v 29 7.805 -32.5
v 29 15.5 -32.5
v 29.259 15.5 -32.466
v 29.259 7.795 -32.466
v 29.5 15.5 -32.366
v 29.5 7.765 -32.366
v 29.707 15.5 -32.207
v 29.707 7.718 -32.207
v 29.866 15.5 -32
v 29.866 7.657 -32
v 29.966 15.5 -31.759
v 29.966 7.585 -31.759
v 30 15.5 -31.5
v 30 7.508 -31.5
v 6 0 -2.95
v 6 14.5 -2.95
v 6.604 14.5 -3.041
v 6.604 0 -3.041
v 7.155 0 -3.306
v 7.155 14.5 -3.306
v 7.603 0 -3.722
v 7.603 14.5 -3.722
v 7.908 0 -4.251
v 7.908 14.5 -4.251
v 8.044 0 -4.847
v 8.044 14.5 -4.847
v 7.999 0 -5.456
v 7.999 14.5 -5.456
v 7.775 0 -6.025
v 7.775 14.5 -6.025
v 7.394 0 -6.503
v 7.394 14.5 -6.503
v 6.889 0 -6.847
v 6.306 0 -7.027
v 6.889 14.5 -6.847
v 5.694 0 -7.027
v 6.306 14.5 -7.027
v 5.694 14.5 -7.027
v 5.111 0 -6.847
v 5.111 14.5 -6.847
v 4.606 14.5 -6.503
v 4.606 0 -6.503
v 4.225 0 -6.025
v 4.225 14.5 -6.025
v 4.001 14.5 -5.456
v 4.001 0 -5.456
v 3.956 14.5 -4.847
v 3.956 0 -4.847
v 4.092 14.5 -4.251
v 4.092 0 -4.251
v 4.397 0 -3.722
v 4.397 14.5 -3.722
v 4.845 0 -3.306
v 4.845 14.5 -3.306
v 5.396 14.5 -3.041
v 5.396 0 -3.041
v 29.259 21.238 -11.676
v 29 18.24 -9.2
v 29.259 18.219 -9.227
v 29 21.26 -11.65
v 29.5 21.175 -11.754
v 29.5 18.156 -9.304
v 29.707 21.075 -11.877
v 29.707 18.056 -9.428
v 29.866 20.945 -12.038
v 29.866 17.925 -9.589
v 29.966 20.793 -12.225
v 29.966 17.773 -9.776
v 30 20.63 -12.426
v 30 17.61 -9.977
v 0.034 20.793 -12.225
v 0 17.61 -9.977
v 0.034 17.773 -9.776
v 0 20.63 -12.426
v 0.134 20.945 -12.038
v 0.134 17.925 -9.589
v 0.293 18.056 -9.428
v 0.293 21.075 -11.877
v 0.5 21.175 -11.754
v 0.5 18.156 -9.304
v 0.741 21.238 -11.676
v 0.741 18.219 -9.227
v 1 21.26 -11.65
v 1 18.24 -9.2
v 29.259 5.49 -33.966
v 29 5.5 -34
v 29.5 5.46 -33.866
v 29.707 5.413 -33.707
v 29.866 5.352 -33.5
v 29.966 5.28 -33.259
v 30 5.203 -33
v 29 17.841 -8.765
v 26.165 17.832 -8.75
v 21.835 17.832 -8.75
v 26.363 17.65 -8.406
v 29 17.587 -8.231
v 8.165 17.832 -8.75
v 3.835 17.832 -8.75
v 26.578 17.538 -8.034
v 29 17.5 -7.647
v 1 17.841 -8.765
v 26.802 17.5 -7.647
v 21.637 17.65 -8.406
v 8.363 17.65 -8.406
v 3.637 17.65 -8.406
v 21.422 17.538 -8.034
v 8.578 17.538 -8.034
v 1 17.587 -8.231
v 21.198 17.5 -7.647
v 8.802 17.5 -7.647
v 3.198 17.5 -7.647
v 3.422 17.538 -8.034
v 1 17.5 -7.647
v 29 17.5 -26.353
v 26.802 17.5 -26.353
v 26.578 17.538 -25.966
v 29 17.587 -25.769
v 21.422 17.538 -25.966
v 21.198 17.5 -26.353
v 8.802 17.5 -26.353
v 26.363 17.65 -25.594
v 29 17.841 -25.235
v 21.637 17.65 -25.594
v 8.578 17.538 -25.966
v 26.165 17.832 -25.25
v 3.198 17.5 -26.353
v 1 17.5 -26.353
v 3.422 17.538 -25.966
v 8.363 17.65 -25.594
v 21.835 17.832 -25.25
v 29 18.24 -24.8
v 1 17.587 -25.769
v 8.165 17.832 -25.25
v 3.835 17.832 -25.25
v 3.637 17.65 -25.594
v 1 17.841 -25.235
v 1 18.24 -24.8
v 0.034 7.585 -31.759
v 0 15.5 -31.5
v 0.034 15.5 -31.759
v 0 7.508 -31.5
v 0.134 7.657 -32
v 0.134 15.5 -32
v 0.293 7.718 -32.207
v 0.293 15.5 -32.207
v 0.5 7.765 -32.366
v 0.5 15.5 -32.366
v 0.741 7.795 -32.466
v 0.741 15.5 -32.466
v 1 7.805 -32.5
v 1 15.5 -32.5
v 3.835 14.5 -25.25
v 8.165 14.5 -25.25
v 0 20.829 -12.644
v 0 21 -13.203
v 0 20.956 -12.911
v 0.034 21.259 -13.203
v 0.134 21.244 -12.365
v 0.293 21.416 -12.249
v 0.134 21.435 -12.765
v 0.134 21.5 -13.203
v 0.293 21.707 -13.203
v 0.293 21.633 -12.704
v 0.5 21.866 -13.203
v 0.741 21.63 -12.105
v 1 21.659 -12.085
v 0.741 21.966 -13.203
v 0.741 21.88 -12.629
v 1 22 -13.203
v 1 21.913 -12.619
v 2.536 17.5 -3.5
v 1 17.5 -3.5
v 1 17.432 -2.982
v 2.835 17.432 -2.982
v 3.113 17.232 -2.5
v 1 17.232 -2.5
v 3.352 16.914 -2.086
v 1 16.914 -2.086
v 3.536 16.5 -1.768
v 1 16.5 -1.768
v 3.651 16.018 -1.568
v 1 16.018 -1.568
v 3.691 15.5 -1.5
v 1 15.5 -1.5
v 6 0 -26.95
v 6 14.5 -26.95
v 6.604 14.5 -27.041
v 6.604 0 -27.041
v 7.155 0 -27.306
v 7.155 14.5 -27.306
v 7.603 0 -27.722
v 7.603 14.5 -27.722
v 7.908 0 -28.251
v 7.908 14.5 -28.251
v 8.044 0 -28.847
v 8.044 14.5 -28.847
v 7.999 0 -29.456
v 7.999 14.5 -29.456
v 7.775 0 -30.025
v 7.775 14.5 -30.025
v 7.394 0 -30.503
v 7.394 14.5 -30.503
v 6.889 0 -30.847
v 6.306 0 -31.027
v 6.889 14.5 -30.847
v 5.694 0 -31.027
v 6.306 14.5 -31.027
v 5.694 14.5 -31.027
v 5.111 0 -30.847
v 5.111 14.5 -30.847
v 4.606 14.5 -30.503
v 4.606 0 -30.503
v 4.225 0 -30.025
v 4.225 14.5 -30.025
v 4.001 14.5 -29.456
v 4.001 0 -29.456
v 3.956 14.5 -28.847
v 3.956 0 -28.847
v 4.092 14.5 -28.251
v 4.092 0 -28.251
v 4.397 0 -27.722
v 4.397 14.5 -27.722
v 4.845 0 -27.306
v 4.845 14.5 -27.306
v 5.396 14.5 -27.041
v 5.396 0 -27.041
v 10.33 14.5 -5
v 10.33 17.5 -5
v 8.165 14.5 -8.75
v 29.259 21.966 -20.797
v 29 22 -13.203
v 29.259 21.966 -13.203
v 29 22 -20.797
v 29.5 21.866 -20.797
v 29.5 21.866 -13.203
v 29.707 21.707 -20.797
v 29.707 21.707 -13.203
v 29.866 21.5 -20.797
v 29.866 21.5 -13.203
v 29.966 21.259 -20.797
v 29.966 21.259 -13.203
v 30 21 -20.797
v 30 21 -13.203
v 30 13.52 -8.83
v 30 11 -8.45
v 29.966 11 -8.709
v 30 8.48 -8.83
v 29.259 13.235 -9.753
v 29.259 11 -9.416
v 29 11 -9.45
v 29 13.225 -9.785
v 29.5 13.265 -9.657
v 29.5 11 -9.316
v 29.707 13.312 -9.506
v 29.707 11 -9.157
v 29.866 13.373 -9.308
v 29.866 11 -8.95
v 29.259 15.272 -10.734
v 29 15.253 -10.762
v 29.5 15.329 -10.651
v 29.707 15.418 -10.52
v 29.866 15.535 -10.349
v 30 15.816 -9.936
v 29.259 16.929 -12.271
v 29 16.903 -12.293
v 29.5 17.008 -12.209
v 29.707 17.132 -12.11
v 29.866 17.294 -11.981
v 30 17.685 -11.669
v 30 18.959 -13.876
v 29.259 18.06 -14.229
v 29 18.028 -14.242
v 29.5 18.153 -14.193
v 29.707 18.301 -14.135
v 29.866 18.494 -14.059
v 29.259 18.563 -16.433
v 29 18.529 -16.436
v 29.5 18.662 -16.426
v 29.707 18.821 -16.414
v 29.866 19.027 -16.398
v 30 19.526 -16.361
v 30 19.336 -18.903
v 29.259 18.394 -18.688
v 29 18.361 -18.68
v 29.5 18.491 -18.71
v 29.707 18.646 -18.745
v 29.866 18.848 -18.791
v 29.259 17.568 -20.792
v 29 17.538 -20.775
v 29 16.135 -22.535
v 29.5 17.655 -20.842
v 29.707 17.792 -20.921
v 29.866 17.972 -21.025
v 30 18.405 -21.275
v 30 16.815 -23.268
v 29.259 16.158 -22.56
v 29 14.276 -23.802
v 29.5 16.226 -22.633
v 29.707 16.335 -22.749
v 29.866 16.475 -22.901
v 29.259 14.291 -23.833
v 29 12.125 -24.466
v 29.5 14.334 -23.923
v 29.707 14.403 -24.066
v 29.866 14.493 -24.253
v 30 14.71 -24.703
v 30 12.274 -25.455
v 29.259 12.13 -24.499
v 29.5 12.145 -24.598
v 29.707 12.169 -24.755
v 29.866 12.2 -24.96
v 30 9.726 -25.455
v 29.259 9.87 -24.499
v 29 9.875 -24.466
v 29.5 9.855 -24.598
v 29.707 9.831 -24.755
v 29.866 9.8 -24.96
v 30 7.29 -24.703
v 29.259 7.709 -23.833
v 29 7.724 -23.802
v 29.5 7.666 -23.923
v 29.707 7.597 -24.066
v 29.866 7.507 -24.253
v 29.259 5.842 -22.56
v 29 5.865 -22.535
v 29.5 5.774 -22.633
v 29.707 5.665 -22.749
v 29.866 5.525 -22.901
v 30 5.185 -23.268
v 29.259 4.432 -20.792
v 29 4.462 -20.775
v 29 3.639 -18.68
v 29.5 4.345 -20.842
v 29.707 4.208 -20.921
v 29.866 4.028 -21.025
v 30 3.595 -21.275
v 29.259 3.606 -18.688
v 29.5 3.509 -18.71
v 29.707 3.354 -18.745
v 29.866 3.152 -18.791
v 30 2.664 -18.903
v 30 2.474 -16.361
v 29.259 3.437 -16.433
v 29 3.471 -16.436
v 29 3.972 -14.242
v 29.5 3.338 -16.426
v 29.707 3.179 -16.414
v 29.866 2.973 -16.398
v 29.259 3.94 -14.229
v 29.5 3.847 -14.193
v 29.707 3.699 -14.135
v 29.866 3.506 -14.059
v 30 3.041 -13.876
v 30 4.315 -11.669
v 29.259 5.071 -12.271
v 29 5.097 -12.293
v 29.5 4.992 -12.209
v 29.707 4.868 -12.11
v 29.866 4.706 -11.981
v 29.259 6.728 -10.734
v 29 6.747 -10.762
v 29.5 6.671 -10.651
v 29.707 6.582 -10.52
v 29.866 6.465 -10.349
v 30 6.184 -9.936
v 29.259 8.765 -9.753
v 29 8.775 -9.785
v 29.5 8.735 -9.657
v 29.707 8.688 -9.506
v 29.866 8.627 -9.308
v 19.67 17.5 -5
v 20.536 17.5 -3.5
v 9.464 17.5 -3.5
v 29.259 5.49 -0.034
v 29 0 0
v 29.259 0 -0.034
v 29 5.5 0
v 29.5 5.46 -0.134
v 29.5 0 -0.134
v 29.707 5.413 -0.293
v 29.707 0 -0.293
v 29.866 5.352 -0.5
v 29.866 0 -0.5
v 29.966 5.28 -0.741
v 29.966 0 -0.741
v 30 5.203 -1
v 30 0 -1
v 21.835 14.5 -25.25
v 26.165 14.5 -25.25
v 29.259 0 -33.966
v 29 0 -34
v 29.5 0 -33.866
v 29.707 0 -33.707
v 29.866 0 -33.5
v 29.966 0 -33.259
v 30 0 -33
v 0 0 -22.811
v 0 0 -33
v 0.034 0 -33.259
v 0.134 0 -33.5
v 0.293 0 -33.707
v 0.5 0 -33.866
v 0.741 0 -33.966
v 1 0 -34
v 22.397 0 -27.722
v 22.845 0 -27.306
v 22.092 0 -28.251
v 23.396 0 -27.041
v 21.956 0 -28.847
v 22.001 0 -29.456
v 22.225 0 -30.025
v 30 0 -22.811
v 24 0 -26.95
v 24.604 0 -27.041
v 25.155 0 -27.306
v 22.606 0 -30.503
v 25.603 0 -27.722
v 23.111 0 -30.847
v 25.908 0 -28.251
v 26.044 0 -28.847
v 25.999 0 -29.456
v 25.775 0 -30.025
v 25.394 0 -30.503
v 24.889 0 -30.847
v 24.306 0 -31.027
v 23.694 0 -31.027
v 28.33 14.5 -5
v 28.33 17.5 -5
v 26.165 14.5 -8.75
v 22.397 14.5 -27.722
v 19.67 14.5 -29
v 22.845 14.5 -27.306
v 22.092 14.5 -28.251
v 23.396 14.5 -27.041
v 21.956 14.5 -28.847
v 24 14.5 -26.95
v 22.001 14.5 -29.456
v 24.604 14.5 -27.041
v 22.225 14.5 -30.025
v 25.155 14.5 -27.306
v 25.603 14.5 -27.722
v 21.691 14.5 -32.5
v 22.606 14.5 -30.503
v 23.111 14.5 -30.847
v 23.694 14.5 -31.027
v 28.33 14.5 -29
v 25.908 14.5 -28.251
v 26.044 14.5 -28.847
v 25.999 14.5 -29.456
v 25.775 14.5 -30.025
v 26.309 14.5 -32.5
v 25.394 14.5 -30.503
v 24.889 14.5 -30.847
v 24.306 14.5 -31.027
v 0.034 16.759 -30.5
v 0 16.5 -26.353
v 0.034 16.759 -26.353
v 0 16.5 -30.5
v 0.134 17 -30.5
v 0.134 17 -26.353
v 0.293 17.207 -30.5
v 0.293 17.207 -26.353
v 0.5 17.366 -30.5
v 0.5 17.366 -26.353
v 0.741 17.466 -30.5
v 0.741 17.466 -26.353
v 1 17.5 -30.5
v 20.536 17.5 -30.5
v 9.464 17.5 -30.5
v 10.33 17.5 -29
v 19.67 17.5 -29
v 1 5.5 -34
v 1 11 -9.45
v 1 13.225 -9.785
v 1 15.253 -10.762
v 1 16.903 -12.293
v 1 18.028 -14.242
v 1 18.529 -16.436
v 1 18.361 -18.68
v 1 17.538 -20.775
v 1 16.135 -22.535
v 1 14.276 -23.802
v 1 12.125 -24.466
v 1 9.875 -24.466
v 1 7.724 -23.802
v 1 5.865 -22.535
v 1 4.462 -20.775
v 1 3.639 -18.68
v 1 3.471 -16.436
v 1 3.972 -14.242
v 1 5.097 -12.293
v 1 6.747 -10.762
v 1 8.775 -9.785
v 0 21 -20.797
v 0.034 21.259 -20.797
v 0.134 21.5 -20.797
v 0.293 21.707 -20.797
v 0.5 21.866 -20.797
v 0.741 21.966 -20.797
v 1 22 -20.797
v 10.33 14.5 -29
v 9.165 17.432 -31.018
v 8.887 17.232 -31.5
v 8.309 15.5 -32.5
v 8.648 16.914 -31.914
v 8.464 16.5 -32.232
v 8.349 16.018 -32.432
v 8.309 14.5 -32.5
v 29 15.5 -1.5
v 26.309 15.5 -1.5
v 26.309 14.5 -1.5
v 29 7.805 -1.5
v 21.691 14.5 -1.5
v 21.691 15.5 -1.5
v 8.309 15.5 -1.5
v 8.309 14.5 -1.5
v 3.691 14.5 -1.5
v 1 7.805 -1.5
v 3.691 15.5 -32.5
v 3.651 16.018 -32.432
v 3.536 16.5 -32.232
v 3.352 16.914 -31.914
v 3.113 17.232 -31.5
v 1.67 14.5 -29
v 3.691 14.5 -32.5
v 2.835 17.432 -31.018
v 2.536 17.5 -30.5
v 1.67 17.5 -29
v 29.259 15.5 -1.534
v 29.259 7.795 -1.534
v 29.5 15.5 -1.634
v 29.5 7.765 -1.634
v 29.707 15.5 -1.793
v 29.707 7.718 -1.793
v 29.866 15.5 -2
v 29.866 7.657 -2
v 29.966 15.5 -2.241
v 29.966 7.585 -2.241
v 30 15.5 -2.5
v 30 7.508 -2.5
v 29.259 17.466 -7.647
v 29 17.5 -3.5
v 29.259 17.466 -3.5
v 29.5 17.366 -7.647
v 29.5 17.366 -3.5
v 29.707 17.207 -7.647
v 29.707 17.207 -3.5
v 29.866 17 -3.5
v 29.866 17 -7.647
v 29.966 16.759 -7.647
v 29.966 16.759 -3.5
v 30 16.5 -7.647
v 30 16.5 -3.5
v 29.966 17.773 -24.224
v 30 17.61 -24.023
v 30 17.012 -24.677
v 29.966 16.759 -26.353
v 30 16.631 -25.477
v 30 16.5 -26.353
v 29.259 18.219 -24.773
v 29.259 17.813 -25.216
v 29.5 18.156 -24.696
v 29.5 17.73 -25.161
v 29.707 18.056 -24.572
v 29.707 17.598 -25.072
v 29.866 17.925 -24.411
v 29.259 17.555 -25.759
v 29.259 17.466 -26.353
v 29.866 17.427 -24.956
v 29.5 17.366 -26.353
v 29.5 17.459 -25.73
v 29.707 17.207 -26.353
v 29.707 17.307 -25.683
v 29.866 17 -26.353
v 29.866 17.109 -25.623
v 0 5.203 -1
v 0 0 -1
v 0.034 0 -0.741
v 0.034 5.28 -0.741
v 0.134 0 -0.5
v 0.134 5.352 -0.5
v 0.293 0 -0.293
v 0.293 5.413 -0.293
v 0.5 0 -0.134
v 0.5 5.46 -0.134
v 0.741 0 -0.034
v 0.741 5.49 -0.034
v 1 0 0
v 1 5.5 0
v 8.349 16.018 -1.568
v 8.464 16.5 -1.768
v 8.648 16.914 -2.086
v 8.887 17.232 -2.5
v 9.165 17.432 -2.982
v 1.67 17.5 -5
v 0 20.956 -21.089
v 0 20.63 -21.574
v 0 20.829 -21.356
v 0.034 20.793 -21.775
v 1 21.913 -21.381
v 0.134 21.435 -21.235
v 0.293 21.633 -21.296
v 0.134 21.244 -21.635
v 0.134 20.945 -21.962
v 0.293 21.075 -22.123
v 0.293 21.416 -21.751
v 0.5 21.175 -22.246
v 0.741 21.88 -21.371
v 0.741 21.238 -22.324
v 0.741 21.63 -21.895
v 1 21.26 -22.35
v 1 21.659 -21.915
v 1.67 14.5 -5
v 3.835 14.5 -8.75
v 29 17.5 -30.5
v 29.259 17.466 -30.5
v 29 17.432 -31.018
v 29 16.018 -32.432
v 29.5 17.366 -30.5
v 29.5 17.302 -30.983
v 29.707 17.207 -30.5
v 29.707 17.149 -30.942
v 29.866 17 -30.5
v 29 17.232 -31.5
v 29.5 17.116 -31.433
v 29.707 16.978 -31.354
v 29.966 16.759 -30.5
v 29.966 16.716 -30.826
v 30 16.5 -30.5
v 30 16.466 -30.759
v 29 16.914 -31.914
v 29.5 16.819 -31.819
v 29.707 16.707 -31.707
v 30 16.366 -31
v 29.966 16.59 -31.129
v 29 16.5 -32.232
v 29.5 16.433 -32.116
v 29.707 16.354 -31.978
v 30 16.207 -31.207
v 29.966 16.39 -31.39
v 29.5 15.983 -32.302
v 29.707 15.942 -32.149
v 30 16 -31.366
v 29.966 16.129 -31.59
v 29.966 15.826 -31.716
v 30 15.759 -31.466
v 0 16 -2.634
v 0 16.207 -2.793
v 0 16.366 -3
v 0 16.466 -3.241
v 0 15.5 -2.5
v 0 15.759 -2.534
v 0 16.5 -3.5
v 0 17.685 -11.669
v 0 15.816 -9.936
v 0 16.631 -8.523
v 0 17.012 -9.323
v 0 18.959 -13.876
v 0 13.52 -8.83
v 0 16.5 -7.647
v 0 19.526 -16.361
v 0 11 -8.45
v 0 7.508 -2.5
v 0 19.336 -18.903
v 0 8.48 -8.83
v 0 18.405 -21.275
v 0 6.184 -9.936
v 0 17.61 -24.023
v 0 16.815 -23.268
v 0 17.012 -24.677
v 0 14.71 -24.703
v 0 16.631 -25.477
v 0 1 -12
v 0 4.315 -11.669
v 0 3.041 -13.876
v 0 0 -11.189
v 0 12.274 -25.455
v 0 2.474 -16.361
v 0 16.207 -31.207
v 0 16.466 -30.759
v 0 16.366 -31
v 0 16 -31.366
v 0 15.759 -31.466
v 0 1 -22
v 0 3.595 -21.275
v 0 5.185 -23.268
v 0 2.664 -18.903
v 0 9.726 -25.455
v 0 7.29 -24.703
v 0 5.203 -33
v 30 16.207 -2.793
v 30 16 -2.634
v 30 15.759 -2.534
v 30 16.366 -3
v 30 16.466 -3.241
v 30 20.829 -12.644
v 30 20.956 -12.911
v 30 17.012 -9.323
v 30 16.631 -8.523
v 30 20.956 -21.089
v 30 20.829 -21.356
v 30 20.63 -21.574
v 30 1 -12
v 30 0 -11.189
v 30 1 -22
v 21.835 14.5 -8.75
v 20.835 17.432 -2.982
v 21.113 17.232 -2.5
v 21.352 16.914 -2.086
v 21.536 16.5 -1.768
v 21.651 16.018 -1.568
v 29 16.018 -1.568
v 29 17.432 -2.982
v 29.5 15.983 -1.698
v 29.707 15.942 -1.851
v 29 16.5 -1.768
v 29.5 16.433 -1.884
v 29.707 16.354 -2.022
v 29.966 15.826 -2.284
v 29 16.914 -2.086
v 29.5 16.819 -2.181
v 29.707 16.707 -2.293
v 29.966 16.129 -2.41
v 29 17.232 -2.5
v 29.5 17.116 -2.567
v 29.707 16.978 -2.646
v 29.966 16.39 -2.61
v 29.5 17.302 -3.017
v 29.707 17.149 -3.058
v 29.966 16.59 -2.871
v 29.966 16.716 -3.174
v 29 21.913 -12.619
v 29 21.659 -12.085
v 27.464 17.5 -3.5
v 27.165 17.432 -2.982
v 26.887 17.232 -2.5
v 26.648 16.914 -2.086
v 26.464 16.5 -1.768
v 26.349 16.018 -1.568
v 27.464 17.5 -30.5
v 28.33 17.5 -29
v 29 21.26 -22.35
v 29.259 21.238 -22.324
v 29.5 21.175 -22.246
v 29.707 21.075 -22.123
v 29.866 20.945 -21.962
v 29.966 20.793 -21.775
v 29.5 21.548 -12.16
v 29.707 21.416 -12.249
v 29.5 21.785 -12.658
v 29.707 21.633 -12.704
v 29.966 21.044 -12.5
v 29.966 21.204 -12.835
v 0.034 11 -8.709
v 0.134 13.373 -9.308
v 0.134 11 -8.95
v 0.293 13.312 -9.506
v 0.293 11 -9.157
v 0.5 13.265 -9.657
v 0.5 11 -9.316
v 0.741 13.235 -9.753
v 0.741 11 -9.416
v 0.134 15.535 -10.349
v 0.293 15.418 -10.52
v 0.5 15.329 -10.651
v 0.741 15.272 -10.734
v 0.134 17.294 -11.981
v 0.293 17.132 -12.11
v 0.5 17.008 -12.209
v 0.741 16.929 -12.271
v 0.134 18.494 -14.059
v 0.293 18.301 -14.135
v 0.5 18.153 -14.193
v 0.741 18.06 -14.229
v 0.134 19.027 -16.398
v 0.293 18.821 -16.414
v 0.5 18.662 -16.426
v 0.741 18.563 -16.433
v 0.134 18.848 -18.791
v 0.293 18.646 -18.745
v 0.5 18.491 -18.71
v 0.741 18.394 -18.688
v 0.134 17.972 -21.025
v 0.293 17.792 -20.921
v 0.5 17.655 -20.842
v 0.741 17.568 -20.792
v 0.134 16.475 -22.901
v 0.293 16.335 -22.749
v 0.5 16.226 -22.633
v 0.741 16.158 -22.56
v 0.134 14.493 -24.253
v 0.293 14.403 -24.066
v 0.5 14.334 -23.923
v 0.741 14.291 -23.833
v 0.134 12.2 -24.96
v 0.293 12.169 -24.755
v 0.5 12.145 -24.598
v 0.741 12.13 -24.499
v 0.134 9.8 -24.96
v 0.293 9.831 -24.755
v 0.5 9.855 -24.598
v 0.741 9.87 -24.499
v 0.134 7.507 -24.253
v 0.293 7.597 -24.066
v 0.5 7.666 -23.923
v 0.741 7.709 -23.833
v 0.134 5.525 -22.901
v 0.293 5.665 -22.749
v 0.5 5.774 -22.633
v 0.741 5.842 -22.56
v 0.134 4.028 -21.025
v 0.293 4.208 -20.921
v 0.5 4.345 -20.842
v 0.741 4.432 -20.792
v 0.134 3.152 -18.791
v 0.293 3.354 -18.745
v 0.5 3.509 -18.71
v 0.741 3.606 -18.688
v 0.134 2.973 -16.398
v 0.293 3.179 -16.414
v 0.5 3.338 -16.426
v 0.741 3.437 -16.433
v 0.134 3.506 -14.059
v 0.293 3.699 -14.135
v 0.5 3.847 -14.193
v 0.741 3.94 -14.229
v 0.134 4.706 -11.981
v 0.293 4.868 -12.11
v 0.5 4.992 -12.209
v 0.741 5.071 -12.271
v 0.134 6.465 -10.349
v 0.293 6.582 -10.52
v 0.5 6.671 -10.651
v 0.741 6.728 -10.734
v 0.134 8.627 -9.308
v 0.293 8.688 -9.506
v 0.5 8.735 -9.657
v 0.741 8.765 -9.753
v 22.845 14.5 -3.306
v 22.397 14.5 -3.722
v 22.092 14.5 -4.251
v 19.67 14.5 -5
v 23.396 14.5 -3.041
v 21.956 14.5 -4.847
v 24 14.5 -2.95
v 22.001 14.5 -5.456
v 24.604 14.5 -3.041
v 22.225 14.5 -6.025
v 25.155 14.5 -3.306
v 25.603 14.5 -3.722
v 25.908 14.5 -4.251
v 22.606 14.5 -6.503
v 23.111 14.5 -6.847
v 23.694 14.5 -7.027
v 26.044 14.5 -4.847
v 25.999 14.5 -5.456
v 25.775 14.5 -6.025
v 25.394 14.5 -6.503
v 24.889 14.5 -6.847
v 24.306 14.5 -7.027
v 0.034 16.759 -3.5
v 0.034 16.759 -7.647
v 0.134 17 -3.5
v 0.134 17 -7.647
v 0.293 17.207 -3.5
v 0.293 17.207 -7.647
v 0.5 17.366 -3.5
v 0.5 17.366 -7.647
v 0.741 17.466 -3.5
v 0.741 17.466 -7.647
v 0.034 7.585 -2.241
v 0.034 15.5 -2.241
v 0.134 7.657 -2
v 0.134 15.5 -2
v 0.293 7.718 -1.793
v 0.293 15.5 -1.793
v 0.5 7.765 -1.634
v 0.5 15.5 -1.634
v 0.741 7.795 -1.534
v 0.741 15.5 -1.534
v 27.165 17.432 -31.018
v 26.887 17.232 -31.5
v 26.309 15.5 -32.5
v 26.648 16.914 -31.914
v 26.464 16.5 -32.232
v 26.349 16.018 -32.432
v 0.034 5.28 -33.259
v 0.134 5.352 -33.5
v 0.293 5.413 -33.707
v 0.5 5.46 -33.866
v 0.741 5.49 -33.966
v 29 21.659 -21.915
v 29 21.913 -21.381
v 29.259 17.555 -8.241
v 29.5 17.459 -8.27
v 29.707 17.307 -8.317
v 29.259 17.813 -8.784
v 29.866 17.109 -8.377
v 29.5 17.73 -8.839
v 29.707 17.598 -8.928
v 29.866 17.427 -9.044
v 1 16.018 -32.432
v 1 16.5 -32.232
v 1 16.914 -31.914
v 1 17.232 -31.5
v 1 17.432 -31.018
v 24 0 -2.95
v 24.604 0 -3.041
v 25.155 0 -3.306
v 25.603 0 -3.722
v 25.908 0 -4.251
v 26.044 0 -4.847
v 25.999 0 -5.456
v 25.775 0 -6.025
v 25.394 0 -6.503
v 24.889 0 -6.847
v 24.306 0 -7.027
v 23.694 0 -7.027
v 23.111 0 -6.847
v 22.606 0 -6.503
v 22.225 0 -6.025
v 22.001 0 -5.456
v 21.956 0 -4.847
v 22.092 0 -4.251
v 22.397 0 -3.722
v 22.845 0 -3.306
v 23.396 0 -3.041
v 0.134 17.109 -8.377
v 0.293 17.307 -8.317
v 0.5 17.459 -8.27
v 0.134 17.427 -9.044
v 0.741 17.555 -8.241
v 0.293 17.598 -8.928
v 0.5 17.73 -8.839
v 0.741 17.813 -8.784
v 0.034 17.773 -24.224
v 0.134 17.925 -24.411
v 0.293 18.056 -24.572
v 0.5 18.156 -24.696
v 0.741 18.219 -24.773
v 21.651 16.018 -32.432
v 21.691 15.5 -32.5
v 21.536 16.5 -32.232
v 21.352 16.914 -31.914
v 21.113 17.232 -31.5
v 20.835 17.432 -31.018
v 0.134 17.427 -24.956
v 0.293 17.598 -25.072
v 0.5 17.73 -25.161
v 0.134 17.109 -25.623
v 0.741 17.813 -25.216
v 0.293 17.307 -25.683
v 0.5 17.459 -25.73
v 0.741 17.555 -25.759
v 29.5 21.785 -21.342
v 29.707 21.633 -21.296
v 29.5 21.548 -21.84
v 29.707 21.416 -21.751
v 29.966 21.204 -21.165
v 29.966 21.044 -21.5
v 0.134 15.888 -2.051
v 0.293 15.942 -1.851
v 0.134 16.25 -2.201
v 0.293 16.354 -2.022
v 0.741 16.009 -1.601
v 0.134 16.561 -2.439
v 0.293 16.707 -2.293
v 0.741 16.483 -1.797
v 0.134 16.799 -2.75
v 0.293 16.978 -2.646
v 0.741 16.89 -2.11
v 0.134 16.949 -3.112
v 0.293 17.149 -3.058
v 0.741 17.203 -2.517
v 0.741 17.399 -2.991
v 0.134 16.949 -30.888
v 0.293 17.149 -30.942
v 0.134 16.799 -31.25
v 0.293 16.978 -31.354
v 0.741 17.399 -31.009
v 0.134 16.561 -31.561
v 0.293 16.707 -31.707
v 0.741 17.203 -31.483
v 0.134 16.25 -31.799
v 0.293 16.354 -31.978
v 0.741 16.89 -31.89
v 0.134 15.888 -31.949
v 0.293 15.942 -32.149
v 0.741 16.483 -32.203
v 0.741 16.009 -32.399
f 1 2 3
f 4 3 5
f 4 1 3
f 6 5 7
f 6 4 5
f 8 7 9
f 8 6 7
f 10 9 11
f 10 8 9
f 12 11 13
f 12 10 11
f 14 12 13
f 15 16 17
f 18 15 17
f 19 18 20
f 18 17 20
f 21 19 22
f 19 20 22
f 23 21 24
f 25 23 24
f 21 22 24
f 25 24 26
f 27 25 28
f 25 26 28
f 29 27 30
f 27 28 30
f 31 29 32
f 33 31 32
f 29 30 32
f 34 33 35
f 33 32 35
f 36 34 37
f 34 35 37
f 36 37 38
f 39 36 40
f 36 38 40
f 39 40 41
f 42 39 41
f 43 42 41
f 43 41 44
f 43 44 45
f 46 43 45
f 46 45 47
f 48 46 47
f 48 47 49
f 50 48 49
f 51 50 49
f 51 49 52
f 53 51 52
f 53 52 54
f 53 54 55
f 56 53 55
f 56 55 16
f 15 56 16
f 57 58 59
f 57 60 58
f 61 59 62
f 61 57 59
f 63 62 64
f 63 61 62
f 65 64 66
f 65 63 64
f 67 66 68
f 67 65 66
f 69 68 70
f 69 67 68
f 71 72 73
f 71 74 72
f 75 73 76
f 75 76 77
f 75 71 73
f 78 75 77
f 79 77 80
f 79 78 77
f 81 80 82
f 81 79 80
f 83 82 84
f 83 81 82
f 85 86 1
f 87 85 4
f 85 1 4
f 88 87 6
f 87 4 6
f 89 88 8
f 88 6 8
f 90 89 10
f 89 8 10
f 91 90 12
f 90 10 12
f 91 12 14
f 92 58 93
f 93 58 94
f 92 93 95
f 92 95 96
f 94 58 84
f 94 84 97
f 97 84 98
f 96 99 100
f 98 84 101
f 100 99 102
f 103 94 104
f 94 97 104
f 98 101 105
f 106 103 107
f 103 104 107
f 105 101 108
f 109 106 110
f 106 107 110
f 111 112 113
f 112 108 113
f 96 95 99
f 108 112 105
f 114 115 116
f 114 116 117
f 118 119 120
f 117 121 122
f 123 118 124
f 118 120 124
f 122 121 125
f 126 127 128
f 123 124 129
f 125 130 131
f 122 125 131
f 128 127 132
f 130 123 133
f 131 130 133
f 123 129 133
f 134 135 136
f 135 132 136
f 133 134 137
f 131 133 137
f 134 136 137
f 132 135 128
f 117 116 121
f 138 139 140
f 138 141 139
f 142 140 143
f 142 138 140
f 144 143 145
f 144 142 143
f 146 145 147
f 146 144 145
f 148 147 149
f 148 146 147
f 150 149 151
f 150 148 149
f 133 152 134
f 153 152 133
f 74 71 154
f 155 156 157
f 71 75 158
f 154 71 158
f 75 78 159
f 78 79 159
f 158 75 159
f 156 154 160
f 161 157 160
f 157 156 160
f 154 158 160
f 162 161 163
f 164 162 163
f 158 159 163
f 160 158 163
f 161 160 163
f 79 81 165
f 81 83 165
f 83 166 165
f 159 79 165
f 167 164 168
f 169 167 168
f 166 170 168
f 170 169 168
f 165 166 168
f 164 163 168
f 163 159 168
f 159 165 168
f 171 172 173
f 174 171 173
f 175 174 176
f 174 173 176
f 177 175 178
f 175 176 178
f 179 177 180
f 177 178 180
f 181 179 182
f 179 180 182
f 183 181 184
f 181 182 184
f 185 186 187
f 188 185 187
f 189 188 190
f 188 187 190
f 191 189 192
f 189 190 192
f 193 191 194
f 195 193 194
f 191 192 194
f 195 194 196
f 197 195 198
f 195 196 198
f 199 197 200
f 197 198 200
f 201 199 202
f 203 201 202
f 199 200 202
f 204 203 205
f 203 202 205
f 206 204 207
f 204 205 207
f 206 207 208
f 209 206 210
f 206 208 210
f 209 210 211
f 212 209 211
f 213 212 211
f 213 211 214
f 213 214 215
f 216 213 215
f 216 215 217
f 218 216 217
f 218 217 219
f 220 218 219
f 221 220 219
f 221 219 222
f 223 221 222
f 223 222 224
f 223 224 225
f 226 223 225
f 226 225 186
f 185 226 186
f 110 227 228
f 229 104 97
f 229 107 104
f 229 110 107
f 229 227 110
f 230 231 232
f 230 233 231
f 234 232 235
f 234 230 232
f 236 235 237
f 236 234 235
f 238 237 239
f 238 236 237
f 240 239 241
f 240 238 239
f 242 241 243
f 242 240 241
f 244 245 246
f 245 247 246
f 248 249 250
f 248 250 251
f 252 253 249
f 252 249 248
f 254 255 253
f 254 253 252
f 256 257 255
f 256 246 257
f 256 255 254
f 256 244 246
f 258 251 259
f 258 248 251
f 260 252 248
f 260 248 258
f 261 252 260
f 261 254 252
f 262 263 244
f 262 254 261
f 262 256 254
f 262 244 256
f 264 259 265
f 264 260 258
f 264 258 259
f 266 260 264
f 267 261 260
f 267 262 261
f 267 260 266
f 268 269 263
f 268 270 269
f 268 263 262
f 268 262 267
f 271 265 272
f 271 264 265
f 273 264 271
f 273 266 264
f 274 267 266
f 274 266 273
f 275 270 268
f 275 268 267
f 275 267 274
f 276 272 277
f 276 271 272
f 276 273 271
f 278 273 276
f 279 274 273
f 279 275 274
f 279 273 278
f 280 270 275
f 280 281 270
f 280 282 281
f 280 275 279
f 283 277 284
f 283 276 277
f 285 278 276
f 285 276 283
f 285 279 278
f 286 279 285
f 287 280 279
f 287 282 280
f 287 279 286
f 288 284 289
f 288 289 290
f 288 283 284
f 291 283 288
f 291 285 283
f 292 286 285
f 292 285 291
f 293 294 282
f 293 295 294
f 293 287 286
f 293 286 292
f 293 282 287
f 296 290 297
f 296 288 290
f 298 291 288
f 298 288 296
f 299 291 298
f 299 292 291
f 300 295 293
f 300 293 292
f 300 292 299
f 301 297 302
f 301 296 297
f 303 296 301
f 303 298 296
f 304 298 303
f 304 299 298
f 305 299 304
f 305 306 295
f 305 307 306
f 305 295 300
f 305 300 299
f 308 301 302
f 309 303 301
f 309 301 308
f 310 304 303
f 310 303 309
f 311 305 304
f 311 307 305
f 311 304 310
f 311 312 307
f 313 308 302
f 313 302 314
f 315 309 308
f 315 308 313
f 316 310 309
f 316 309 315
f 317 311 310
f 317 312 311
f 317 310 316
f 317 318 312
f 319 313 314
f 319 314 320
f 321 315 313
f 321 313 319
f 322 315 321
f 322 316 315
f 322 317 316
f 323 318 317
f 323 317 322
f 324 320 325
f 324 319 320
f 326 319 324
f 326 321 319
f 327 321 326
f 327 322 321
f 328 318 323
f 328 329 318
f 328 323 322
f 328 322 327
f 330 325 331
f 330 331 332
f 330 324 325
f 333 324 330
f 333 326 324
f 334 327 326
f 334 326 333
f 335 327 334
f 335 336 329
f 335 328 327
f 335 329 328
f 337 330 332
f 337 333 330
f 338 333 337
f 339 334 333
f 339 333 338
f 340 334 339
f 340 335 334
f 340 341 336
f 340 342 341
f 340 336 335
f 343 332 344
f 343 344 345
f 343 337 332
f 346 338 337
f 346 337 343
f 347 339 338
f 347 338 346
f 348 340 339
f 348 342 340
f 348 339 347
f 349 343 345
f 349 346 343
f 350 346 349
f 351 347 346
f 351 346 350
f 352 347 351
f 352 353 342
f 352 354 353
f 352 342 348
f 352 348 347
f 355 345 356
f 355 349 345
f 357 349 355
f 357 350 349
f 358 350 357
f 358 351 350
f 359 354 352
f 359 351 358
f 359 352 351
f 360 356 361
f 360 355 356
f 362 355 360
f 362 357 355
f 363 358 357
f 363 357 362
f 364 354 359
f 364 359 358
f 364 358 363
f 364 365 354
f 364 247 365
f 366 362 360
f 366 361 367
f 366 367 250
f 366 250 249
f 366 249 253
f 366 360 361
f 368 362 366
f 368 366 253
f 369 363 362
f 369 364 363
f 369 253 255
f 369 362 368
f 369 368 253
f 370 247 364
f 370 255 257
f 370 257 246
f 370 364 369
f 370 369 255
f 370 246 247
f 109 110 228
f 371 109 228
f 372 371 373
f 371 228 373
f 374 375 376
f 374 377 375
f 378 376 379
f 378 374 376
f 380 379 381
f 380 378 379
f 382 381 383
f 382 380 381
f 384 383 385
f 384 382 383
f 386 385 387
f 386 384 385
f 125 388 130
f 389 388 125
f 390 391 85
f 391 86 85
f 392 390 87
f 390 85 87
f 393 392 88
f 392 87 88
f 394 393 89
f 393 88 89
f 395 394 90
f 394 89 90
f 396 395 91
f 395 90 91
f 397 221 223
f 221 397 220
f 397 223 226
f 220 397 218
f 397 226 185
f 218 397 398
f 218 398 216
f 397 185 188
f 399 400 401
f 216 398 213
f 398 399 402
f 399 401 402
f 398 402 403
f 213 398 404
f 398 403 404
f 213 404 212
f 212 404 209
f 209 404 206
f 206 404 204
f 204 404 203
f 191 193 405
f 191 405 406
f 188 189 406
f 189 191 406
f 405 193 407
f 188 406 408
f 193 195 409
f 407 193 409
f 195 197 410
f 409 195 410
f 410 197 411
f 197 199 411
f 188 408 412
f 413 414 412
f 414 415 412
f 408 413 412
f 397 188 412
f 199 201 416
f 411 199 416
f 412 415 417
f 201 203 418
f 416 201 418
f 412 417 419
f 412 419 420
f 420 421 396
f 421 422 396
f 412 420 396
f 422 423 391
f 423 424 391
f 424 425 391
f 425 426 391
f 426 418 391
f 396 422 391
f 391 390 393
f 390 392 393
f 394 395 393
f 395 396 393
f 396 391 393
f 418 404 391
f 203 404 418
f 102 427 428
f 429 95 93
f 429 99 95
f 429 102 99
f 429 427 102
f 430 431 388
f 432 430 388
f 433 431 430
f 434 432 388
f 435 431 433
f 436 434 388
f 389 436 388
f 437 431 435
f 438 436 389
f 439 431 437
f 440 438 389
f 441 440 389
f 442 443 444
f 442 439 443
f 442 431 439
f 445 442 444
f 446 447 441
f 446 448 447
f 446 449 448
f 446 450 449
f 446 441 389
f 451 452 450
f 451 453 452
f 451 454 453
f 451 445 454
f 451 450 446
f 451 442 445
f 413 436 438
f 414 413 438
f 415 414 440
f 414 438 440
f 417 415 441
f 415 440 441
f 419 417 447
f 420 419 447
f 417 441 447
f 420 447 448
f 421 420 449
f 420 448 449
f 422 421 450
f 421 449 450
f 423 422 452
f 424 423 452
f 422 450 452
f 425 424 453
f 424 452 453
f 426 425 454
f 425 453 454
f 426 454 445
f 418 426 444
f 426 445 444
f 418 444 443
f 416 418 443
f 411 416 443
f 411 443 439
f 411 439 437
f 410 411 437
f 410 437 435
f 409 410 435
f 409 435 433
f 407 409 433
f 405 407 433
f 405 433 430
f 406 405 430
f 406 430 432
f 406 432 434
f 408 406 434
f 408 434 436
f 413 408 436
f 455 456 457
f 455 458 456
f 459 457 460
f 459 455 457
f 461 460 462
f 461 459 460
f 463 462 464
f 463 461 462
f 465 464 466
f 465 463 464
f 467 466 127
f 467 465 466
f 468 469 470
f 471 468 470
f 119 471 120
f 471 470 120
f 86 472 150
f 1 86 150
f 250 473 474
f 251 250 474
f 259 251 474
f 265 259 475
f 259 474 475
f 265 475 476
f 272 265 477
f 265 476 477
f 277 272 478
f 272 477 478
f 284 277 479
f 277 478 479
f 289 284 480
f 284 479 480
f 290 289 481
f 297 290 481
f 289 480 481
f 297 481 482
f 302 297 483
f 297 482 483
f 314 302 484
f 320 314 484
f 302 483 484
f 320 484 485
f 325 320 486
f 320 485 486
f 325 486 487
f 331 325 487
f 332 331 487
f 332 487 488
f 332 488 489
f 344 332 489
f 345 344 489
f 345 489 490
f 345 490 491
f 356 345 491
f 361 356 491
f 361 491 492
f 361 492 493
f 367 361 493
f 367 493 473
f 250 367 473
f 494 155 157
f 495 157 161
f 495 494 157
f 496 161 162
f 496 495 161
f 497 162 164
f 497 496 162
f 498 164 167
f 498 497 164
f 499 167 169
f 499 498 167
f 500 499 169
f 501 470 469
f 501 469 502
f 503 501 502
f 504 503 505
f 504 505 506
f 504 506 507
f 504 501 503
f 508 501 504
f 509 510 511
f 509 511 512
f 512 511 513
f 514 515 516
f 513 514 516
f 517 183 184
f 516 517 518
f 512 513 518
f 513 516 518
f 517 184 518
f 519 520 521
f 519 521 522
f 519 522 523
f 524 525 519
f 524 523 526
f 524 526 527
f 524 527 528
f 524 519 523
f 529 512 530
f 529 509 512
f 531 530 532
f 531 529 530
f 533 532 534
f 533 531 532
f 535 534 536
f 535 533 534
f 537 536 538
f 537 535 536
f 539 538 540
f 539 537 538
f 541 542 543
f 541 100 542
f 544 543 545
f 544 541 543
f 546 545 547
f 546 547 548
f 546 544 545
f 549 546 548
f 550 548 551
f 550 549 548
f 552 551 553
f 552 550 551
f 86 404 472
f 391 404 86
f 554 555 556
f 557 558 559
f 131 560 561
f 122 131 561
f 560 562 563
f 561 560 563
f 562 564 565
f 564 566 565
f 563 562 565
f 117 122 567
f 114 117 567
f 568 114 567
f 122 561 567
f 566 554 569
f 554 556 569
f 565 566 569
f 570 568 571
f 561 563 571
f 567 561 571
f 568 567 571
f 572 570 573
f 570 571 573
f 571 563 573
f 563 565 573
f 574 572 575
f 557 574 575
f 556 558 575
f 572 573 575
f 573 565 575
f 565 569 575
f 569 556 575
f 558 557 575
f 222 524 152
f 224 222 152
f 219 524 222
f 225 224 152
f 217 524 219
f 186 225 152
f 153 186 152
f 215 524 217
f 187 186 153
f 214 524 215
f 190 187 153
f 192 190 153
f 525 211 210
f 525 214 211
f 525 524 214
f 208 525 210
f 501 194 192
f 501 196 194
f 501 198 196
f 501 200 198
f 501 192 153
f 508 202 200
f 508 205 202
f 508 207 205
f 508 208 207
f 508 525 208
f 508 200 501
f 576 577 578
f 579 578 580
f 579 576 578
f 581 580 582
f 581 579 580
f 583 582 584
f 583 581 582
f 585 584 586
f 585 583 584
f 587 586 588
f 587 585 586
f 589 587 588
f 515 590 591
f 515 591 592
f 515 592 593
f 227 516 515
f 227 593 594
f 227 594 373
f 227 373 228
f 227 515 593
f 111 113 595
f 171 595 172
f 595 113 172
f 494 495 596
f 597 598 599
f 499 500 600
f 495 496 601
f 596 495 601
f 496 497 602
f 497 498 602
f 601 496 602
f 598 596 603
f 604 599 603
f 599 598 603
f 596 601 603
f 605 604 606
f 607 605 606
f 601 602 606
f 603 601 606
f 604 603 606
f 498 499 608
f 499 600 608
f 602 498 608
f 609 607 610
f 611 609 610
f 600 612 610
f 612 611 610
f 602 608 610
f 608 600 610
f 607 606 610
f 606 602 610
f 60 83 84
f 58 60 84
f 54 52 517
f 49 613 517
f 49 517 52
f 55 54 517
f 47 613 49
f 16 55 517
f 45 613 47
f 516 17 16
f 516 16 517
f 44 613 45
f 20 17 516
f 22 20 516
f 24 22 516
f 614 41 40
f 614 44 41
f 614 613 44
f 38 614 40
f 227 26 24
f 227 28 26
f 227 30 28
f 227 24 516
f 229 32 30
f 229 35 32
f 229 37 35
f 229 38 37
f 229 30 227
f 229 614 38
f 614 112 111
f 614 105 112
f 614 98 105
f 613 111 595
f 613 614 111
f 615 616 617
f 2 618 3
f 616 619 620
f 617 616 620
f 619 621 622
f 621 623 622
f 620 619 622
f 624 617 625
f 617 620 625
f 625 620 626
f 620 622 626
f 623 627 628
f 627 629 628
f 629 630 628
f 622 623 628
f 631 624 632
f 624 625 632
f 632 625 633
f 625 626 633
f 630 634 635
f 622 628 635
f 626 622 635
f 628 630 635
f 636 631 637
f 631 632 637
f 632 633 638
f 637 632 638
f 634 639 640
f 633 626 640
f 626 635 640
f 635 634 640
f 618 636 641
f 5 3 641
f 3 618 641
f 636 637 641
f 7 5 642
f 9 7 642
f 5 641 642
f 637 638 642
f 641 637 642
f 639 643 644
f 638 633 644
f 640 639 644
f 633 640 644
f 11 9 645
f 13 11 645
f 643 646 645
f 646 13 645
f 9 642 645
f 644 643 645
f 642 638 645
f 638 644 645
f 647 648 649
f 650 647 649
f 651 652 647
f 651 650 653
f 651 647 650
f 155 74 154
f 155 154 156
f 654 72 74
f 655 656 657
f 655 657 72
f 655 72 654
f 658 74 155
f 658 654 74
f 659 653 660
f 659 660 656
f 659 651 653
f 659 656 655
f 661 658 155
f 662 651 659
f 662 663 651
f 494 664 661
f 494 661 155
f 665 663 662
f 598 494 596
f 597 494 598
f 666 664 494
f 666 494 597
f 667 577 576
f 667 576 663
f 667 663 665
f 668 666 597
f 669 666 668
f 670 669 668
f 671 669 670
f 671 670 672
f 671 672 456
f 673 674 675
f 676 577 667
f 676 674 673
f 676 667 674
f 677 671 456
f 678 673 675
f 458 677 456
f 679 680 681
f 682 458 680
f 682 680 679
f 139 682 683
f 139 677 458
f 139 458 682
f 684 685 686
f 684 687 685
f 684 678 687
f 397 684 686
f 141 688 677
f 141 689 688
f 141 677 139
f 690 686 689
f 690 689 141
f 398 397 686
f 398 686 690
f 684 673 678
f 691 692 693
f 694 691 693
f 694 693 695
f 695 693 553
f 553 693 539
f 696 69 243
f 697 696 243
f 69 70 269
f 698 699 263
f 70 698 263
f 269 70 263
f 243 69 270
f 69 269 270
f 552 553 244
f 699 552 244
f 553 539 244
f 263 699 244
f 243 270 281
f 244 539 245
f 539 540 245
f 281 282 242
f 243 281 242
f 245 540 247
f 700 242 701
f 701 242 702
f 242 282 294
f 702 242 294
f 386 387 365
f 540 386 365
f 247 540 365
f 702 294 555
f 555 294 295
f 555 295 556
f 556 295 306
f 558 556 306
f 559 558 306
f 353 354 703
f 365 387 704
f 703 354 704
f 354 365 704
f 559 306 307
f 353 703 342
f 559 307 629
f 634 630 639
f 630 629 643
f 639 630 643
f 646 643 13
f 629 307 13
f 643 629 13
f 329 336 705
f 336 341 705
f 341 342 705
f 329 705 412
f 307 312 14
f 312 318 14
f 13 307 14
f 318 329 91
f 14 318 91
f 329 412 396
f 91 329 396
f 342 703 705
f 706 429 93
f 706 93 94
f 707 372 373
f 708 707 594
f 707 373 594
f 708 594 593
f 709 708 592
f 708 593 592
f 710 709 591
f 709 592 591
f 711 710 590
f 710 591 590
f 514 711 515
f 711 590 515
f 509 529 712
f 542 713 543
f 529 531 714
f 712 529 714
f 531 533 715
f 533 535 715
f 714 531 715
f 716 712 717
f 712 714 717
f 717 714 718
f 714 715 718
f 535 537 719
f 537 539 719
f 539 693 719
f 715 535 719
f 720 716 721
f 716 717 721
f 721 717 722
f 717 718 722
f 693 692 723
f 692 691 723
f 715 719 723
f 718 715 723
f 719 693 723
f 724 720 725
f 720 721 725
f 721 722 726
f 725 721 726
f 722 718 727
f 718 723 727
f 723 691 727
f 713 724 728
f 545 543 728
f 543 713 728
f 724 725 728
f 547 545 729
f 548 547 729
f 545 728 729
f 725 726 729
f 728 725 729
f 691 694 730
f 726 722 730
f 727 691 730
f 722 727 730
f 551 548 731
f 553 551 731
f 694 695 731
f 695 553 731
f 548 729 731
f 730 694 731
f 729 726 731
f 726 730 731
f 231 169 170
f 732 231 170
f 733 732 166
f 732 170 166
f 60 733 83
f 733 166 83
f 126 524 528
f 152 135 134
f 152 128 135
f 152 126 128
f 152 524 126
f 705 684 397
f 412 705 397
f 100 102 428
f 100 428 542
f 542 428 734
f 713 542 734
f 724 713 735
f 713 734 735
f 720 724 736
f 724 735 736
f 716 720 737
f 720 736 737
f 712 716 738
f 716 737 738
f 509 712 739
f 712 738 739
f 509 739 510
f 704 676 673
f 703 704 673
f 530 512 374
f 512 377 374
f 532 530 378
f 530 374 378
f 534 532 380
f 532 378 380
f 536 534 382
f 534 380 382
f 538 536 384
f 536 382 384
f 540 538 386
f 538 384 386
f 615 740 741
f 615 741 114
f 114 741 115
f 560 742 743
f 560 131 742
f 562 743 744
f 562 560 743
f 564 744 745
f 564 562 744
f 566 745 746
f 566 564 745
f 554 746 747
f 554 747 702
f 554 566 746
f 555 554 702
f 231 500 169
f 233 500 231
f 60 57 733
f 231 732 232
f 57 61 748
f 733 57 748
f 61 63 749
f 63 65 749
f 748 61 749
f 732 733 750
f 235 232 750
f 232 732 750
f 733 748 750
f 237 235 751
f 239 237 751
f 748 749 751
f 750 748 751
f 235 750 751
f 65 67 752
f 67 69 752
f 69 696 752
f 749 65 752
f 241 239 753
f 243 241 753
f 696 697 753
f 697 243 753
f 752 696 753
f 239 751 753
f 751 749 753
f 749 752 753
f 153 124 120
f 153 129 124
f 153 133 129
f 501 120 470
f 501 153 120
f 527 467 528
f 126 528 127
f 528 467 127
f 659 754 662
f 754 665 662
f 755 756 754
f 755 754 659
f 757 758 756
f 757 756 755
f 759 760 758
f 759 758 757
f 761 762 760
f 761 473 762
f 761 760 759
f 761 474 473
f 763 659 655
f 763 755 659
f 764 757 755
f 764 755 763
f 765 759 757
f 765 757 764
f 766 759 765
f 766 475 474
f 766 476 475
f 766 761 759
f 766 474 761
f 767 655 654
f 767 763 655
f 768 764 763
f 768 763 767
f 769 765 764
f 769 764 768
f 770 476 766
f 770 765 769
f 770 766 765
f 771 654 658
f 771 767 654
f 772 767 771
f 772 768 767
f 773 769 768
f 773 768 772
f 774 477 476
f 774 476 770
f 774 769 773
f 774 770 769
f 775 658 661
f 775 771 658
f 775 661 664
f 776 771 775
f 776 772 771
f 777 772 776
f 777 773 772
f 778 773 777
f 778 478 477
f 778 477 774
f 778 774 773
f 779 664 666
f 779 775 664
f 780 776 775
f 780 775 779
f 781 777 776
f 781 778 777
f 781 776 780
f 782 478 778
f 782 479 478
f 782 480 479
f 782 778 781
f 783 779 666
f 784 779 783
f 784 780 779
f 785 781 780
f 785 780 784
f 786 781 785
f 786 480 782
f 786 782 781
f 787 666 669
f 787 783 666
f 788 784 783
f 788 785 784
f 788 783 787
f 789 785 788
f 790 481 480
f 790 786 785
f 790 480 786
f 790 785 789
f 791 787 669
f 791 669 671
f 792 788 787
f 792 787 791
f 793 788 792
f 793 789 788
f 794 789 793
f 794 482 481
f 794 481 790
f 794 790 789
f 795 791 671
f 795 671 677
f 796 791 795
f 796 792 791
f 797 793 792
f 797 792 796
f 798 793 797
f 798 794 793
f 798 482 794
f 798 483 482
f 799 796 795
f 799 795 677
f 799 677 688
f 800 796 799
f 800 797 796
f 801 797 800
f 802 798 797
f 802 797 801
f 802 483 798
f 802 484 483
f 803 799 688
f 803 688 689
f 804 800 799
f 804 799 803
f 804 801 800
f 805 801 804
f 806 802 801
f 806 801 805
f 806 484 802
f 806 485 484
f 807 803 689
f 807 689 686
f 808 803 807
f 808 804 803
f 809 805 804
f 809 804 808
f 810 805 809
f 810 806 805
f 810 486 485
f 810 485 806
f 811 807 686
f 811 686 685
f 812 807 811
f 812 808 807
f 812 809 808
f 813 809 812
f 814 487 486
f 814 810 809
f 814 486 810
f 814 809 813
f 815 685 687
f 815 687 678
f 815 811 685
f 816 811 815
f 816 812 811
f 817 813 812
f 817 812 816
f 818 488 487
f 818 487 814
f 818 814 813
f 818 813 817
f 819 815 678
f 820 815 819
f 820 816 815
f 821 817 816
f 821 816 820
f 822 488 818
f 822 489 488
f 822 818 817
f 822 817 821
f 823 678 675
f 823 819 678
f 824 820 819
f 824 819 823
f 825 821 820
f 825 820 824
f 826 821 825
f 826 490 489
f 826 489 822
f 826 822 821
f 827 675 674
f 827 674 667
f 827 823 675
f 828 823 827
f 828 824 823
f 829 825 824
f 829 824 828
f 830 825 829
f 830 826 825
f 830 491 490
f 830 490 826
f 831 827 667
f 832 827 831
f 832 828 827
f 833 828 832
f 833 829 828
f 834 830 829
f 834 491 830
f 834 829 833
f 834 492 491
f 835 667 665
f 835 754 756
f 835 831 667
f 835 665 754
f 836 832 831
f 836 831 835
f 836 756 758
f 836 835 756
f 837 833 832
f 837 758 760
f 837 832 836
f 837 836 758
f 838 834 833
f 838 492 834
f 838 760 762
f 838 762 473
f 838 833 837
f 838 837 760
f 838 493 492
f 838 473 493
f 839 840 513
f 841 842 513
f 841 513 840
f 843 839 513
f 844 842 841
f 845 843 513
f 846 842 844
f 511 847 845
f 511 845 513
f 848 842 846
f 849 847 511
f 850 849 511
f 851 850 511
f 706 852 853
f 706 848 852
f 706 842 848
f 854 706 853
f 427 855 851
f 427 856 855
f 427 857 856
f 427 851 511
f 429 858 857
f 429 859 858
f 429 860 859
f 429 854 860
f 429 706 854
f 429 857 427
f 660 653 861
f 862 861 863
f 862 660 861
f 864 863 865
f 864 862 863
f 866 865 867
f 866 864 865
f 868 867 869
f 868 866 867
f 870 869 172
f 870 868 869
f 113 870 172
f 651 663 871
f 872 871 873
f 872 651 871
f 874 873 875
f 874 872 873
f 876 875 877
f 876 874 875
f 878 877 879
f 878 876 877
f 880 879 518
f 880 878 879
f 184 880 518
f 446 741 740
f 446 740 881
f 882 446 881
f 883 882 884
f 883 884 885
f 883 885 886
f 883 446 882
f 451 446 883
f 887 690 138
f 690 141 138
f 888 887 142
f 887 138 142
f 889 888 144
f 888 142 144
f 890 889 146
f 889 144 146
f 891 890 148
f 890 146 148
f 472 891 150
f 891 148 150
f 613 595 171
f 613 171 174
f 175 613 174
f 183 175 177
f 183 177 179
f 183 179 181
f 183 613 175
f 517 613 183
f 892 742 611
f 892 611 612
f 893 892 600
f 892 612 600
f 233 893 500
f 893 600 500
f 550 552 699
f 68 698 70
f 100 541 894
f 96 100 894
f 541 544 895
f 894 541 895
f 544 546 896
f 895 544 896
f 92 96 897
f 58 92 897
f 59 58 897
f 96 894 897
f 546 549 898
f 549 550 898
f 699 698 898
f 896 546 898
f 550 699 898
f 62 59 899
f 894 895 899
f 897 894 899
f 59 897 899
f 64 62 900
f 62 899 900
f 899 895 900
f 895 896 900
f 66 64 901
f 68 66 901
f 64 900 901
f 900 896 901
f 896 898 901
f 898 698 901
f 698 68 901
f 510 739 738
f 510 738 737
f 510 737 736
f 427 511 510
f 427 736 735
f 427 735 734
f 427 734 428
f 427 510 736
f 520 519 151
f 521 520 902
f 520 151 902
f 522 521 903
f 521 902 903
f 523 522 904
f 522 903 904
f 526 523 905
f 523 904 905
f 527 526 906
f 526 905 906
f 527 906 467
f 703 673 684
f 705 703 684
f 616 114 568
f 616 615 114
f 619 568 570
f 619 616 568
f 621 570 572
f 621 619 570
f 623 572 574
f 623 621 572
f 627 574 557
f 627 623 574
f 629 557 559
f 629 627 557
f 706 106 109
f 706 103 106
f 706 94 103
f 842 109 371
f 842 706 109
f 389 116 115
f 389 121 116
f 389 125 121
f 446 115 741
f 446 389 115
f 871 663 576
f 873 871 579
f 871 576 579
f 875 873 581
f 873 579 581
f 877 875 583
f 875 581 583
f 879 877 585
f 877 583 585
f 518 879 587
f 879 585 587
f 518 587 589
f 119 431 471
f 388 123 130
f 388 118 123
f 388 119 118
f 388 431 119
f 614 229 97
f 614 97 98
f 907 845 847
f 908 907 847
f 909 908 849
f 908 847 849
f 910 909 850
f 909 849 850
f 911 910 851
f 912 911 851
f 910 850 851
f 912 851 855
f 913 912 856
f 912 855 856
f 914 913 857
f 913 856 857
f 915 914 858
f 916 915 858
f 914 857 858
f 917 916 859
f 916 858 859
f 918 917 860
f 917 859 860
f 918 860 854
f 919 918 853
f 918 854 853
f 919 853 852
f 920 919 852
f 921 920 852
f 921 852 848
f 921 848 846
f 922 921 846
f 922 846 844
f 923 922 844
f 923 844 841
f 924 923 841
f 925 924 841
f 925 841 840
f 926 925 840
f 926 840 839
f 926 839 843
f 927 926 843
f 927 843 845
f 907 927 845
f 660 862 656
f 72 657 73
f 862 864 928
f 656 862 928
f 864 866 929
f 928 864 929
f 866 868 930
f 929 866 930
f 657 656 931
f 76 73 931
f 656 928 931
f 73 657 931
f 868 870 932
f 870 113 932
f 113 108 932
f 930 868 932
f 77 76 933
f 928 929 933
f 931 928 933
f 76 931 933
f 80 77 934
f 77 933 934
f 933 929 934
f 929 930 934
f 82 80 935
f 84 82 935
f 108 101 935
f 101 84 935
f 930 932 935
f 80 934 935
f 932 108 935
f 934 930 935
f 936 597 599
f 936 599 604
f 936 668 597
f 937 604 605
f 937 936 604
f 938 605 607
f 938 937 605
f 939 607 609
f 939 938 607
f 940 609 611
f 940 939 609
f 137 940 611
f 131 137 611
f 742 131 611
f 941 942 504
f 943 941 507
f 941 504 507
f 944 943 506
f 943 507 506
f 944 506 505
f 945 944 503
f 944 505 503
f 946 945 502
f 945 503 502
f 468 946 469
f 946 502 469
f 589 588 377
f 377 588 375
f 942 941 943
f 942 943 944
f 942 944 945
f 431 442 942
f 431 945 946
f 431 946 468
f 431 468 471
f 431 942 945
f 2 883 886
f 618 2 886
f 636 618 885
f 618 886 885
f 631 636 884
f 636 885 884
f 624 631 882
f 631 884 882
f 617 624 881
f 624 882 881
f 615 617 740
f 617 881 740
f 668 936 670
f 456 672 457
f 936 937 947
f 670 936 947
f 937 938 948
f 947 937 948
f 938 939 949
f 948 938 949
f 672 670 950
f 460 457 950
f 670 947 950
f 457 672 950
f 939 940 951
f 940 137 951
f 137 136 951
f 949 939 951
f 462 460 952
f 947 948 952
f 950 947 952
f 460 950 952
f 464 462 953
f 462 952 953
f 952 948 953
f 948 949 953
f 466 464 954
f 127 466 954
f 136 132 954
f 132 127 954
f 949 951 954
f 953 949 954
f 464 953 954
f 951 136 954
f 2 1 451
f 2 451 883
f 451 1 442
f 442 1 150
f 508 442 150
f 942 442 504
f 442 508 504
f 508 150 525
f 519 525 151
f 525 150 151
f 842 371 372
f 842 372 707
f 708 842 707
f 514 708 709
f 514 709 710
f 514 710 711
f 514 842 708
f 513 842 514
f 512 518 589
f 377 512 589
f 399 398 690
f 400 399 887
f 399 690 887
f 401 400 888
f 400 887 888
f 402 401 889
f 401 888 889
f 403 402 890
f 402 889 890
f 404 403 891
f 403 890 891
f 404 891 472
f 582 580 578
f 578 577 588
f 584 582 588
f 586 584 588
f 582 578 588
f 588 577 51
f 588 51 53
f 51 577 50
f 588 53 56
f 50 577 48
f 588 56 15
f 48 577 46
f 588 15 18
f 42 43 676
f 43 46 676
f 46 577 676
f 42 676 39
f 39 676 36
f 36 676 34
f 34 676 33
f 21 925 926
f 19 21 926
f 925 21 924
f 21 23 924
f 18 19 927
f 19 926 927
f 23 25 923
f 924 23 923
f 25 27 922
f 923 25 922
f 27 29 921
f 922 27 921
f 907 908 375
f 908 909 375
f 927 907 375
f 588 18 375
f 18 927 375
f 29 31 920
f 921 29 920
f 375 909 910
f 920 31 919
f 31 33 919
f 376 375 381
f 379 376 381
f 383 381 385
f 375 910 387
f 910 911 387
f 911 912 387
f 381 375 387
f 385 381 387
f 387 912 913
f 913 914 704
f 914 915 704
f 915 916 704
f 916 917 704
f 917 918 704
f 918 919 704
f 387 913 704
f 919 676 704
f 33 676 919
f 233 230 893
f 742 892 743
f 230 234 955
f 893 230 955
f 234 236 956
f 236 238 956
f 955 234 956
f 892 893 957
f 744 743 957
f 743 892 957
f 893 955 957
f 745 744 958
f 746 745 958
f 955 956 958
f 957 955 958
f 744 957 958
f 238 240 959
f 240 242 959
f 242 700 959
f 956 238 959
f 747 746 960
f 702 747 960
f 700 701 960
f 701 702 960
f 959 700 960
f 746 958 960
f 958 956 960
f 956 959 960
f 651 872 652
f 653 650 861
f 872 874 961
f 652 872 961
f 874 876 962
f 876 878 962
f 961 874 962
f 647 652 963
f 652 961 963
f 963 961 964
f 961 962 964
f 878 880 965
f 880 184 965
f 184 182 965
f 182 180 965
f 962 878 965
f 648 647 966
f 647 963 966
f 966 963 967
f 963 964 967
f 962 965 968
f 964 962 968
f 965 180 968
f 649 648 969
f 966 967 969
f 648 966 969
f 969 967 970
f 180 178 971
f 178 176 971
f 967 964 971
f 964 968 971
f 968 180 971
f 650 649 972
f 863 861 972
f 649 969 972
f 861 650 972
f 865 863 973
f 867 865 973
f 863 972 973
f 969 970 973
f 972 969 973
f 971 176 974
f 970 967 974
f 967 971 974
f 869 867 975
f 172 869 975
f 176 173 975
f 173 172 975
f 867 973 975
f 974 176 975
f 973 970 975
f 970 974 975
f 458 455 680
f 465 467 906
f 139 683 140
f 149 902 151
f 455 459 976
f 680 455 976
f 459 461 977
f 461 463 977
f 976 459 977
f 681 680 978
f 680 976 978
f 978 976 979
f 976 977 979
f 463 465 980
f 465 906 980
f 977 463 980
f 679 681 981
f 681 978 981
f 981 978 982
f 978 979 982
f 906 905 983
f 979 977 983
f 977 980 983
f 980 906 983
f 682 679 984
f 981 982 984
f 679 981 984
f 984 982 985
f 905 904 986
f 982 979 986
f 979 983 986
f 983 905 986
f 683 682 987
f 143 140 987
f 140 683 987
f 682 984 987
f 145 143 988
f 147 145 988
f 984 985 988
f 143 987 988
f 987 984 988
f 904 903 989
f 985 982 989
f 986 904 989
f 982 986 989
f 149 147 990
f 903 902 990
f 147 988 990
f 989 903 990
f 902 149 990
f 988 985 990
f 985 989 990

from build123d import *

# Parameters (mm, degrees)
SKETCH1_W               = 30
SKETCH1_H               = 34
BOSS_EXTRUDE1_DEPTH     = 22
SKETCH2_R               = 2.05
CUT_EXTRUDE1_DEPTH      = 22
SKETCH3_R               = 7.55
CUT_EXTRUDE2_DEPTH      = 51.398412673
CUT_EXTRUDE3_DEPTH      = 3
CUT_EXTRUDE3_DEPTH_BACK = 3
FILLET1_R               = 1


with BuildPart() as part:
    # Sketch1 → Boss-Extrude1 (new body)
    with BuildSketch(Plane(origin=(0, 0, 0), x_dir=(1, 0, 0), z_dir=(0, 1, 0))):
        with Locations((15, 17)):
            Rectangle(SKETCH1_W, SKETCH1_H)
    extrude(amount=BOSS_EXTRUDE1_DEPTH)

    # Sketch2 → Cut-Extrude1 (cut)
    with BuildSketch(Plane(origin=(0, 22, 0), x_dir=(1, 0, 0), z_dir=(0, 1, 0))):
        with Locations(Location((6, 29, 0), (0, 0, 270))):
            Circle(SKETCH2_R)
        with Locations(Location((24, 29, 0), (0, 0, 270))):
            Circle(SKETCH2_R)
        with Locations(Location((24, 5, 0), (0, 0, 270))):
            Circle(SKETCH2_R)
        with Locations(Location((6, 5, 0), (0, 0, 270))):
            Circle(SKETCH2_R)
    extrude(amount=-CUT_EXTRUDE1_DEPTH, mode=Mode.SUBTRACT)

    # Sketch3 → Cut-Extrude2 (cut, through all)
    with BuildSketch(Plane.ZY):
        with BuildLine():
            Line((-34, 22), (-34, 5.5))
            Line((-34, 5.5), (-32.5, 7.804886114))
            Line((-32.5, 7.804886114), (-32.5, 15.5))
            ThreePointArc((-32.5, 15.5), (-31.914213562, 16.914213562), (-30.5, 17.5))
            Line((-30.5, 17.5), (-26.35296805, 17.5))
            ThreePointArc((-26.35296805, 17.5), (-25.492668875, 17.694484747), (-24.799684767, 18.240114671))
            Line((-24.799684767, 18.240114671), (-22.350315233, 21.259885329))
            ThreePointArc((-22.350315233, 21.259885329), (-21.657331125, 21.805515253), (-20.79703195, 22))
            Line((-20.79703195, 22), (-34, 22))
        make_face()
        with BuildLine():
            Line((0, 22), (-13.20296805, 22))
            ThreePointArc((-13.20296805, 22), (-12.342668875, 21.805515253), (-11.649684767, 21.259885329))
            Line((-11.649684767, 21.259885329), (-9.200315233, 18.240114671))
            ThreePointArc((-9.200315233, 18.240114671), (-8.507331125, 17.694484747), (-7.64703195, 17.5))
            Line((-7.64703195, 17.5), (-3.5, 17.5))
            ThreePointArc((-3.5, 17.5), (-2.085786438, 16.914213562), (-1.5, 15.5))
            Line((-1.5, 15.5), (-1.5, 7.804886114))
            Line((-1.5, 7.804886114), (0, 5.5))
            Line((0, 5.5), (0, 22))
        make_face()
        with Locations((-17, 11)):
            Circle(SKETCH3_R)
        Polygon((-22, 1), (-22.811111111, 0), (-11.188888889, 0), (-12, 1), align=None)
    extrude(amount=-CUT_EXTRUDE2_DEPTH, mode=Mode.SUBTRACT)

    # Sketch4 → Cut-Extrude3 (cut, two sides: drawn at the far end of the back side and taken through both)
    with BuildSketch(Plane(origin=(0, 17.5, 0), x_dir=(1, 0, 0), z_dir=(0, 1, 0)).offset(-CUT_EXTRUDE3_DEPTH_BACK)):
        Polygon((8.165063509, 32.75), (3.834936491, 32.75), (1.669872981, 29), (3.834936491, 25.25), (8.165063509, 25.25), (10.330127019, 29), align=None)
        Polygon((26.165063509, 32.75), (21.834936491, 32.75), (19.669872981, 29), (21.834936491, 25.25), (26.165063509, 25.25), (28.330127019, 29), align=None)
        Polygon((21.834936491, 1.25), (26.165063509, 1.25), (28.330127019, 5), (26.165063509, 8.75), (21.834936491, 8.75), (19.669872981, 5), align=None)
        Polygon((8.165063509, 1.25), (10.330127019, 5), (8.165063509, 8.75), (3.834936491, 8.75), (1.669872981, 5), (3.834936491, 1.25), align=None)
    extrude(amount=CUT_EXTRUDE3_DEPTH + CUT_EXTRUDE3_DEPTH_BACK, mode=Mode.SUBTRACT)

    # Fillet1
    fillet1_edges = [part.edges().sort_by_distance(p)[0] for p in [
        (0, 22, -17),
        (30, 22, -17),
        (0, 2.75, -34),
        (30, 2.75, -34),
        (30, 2.75, 0),
        (0, 2.75, 0),
        (0, 16.914213562, -2.085786438),
        (30, 17.5, -5.573515975),
        (0, 21.805515253, -12.342668875),
        (0, 6.652443057, -0.75),
        (0, 11.652443057, -1.5),
        (0, 17.694484747, -8.507331125),
        (30, 19.75, -10.425),
        (30, 21.805515253, -12.342668875),
        (30, 6.652443057, -0.75),
        (30, 11.652443057, -1.5),
        (30, 16.914213562, -2.085786438),
        (30, 17.694484747, -8.507331125),
        (0, 19.75, -10.425),
        (0, 17.5, -5.573515975),
        (30, 11, -24.55),
        (0, 11, -24.55),
        (30, 17.5, -28.426484025),
        (30, 16.914213562, -31.914213562),
        (0, 21.805515253, -21.657331125),
        (30, 19.75, -23.575),
        (30, 17.694484747, -25.492668875),
        (30, 11.652443057, -32.5),
        (30, 6.652443057, -33.25),
        (30, 21.805515253, -21.657331125),
        (0, 6.652443057, -33.25),
        (0, 11.652443057, -32.5),
        (0, 16.914213562, -31.914213562),
        (0, 17.5, -28.426484025),
        (0, 17.694484747, -25.492668875),
        (0, 19.75, -23.575),
    ]]
    fillet(fillet1_edges, radius=FILLET1_R)


solid = part.part
